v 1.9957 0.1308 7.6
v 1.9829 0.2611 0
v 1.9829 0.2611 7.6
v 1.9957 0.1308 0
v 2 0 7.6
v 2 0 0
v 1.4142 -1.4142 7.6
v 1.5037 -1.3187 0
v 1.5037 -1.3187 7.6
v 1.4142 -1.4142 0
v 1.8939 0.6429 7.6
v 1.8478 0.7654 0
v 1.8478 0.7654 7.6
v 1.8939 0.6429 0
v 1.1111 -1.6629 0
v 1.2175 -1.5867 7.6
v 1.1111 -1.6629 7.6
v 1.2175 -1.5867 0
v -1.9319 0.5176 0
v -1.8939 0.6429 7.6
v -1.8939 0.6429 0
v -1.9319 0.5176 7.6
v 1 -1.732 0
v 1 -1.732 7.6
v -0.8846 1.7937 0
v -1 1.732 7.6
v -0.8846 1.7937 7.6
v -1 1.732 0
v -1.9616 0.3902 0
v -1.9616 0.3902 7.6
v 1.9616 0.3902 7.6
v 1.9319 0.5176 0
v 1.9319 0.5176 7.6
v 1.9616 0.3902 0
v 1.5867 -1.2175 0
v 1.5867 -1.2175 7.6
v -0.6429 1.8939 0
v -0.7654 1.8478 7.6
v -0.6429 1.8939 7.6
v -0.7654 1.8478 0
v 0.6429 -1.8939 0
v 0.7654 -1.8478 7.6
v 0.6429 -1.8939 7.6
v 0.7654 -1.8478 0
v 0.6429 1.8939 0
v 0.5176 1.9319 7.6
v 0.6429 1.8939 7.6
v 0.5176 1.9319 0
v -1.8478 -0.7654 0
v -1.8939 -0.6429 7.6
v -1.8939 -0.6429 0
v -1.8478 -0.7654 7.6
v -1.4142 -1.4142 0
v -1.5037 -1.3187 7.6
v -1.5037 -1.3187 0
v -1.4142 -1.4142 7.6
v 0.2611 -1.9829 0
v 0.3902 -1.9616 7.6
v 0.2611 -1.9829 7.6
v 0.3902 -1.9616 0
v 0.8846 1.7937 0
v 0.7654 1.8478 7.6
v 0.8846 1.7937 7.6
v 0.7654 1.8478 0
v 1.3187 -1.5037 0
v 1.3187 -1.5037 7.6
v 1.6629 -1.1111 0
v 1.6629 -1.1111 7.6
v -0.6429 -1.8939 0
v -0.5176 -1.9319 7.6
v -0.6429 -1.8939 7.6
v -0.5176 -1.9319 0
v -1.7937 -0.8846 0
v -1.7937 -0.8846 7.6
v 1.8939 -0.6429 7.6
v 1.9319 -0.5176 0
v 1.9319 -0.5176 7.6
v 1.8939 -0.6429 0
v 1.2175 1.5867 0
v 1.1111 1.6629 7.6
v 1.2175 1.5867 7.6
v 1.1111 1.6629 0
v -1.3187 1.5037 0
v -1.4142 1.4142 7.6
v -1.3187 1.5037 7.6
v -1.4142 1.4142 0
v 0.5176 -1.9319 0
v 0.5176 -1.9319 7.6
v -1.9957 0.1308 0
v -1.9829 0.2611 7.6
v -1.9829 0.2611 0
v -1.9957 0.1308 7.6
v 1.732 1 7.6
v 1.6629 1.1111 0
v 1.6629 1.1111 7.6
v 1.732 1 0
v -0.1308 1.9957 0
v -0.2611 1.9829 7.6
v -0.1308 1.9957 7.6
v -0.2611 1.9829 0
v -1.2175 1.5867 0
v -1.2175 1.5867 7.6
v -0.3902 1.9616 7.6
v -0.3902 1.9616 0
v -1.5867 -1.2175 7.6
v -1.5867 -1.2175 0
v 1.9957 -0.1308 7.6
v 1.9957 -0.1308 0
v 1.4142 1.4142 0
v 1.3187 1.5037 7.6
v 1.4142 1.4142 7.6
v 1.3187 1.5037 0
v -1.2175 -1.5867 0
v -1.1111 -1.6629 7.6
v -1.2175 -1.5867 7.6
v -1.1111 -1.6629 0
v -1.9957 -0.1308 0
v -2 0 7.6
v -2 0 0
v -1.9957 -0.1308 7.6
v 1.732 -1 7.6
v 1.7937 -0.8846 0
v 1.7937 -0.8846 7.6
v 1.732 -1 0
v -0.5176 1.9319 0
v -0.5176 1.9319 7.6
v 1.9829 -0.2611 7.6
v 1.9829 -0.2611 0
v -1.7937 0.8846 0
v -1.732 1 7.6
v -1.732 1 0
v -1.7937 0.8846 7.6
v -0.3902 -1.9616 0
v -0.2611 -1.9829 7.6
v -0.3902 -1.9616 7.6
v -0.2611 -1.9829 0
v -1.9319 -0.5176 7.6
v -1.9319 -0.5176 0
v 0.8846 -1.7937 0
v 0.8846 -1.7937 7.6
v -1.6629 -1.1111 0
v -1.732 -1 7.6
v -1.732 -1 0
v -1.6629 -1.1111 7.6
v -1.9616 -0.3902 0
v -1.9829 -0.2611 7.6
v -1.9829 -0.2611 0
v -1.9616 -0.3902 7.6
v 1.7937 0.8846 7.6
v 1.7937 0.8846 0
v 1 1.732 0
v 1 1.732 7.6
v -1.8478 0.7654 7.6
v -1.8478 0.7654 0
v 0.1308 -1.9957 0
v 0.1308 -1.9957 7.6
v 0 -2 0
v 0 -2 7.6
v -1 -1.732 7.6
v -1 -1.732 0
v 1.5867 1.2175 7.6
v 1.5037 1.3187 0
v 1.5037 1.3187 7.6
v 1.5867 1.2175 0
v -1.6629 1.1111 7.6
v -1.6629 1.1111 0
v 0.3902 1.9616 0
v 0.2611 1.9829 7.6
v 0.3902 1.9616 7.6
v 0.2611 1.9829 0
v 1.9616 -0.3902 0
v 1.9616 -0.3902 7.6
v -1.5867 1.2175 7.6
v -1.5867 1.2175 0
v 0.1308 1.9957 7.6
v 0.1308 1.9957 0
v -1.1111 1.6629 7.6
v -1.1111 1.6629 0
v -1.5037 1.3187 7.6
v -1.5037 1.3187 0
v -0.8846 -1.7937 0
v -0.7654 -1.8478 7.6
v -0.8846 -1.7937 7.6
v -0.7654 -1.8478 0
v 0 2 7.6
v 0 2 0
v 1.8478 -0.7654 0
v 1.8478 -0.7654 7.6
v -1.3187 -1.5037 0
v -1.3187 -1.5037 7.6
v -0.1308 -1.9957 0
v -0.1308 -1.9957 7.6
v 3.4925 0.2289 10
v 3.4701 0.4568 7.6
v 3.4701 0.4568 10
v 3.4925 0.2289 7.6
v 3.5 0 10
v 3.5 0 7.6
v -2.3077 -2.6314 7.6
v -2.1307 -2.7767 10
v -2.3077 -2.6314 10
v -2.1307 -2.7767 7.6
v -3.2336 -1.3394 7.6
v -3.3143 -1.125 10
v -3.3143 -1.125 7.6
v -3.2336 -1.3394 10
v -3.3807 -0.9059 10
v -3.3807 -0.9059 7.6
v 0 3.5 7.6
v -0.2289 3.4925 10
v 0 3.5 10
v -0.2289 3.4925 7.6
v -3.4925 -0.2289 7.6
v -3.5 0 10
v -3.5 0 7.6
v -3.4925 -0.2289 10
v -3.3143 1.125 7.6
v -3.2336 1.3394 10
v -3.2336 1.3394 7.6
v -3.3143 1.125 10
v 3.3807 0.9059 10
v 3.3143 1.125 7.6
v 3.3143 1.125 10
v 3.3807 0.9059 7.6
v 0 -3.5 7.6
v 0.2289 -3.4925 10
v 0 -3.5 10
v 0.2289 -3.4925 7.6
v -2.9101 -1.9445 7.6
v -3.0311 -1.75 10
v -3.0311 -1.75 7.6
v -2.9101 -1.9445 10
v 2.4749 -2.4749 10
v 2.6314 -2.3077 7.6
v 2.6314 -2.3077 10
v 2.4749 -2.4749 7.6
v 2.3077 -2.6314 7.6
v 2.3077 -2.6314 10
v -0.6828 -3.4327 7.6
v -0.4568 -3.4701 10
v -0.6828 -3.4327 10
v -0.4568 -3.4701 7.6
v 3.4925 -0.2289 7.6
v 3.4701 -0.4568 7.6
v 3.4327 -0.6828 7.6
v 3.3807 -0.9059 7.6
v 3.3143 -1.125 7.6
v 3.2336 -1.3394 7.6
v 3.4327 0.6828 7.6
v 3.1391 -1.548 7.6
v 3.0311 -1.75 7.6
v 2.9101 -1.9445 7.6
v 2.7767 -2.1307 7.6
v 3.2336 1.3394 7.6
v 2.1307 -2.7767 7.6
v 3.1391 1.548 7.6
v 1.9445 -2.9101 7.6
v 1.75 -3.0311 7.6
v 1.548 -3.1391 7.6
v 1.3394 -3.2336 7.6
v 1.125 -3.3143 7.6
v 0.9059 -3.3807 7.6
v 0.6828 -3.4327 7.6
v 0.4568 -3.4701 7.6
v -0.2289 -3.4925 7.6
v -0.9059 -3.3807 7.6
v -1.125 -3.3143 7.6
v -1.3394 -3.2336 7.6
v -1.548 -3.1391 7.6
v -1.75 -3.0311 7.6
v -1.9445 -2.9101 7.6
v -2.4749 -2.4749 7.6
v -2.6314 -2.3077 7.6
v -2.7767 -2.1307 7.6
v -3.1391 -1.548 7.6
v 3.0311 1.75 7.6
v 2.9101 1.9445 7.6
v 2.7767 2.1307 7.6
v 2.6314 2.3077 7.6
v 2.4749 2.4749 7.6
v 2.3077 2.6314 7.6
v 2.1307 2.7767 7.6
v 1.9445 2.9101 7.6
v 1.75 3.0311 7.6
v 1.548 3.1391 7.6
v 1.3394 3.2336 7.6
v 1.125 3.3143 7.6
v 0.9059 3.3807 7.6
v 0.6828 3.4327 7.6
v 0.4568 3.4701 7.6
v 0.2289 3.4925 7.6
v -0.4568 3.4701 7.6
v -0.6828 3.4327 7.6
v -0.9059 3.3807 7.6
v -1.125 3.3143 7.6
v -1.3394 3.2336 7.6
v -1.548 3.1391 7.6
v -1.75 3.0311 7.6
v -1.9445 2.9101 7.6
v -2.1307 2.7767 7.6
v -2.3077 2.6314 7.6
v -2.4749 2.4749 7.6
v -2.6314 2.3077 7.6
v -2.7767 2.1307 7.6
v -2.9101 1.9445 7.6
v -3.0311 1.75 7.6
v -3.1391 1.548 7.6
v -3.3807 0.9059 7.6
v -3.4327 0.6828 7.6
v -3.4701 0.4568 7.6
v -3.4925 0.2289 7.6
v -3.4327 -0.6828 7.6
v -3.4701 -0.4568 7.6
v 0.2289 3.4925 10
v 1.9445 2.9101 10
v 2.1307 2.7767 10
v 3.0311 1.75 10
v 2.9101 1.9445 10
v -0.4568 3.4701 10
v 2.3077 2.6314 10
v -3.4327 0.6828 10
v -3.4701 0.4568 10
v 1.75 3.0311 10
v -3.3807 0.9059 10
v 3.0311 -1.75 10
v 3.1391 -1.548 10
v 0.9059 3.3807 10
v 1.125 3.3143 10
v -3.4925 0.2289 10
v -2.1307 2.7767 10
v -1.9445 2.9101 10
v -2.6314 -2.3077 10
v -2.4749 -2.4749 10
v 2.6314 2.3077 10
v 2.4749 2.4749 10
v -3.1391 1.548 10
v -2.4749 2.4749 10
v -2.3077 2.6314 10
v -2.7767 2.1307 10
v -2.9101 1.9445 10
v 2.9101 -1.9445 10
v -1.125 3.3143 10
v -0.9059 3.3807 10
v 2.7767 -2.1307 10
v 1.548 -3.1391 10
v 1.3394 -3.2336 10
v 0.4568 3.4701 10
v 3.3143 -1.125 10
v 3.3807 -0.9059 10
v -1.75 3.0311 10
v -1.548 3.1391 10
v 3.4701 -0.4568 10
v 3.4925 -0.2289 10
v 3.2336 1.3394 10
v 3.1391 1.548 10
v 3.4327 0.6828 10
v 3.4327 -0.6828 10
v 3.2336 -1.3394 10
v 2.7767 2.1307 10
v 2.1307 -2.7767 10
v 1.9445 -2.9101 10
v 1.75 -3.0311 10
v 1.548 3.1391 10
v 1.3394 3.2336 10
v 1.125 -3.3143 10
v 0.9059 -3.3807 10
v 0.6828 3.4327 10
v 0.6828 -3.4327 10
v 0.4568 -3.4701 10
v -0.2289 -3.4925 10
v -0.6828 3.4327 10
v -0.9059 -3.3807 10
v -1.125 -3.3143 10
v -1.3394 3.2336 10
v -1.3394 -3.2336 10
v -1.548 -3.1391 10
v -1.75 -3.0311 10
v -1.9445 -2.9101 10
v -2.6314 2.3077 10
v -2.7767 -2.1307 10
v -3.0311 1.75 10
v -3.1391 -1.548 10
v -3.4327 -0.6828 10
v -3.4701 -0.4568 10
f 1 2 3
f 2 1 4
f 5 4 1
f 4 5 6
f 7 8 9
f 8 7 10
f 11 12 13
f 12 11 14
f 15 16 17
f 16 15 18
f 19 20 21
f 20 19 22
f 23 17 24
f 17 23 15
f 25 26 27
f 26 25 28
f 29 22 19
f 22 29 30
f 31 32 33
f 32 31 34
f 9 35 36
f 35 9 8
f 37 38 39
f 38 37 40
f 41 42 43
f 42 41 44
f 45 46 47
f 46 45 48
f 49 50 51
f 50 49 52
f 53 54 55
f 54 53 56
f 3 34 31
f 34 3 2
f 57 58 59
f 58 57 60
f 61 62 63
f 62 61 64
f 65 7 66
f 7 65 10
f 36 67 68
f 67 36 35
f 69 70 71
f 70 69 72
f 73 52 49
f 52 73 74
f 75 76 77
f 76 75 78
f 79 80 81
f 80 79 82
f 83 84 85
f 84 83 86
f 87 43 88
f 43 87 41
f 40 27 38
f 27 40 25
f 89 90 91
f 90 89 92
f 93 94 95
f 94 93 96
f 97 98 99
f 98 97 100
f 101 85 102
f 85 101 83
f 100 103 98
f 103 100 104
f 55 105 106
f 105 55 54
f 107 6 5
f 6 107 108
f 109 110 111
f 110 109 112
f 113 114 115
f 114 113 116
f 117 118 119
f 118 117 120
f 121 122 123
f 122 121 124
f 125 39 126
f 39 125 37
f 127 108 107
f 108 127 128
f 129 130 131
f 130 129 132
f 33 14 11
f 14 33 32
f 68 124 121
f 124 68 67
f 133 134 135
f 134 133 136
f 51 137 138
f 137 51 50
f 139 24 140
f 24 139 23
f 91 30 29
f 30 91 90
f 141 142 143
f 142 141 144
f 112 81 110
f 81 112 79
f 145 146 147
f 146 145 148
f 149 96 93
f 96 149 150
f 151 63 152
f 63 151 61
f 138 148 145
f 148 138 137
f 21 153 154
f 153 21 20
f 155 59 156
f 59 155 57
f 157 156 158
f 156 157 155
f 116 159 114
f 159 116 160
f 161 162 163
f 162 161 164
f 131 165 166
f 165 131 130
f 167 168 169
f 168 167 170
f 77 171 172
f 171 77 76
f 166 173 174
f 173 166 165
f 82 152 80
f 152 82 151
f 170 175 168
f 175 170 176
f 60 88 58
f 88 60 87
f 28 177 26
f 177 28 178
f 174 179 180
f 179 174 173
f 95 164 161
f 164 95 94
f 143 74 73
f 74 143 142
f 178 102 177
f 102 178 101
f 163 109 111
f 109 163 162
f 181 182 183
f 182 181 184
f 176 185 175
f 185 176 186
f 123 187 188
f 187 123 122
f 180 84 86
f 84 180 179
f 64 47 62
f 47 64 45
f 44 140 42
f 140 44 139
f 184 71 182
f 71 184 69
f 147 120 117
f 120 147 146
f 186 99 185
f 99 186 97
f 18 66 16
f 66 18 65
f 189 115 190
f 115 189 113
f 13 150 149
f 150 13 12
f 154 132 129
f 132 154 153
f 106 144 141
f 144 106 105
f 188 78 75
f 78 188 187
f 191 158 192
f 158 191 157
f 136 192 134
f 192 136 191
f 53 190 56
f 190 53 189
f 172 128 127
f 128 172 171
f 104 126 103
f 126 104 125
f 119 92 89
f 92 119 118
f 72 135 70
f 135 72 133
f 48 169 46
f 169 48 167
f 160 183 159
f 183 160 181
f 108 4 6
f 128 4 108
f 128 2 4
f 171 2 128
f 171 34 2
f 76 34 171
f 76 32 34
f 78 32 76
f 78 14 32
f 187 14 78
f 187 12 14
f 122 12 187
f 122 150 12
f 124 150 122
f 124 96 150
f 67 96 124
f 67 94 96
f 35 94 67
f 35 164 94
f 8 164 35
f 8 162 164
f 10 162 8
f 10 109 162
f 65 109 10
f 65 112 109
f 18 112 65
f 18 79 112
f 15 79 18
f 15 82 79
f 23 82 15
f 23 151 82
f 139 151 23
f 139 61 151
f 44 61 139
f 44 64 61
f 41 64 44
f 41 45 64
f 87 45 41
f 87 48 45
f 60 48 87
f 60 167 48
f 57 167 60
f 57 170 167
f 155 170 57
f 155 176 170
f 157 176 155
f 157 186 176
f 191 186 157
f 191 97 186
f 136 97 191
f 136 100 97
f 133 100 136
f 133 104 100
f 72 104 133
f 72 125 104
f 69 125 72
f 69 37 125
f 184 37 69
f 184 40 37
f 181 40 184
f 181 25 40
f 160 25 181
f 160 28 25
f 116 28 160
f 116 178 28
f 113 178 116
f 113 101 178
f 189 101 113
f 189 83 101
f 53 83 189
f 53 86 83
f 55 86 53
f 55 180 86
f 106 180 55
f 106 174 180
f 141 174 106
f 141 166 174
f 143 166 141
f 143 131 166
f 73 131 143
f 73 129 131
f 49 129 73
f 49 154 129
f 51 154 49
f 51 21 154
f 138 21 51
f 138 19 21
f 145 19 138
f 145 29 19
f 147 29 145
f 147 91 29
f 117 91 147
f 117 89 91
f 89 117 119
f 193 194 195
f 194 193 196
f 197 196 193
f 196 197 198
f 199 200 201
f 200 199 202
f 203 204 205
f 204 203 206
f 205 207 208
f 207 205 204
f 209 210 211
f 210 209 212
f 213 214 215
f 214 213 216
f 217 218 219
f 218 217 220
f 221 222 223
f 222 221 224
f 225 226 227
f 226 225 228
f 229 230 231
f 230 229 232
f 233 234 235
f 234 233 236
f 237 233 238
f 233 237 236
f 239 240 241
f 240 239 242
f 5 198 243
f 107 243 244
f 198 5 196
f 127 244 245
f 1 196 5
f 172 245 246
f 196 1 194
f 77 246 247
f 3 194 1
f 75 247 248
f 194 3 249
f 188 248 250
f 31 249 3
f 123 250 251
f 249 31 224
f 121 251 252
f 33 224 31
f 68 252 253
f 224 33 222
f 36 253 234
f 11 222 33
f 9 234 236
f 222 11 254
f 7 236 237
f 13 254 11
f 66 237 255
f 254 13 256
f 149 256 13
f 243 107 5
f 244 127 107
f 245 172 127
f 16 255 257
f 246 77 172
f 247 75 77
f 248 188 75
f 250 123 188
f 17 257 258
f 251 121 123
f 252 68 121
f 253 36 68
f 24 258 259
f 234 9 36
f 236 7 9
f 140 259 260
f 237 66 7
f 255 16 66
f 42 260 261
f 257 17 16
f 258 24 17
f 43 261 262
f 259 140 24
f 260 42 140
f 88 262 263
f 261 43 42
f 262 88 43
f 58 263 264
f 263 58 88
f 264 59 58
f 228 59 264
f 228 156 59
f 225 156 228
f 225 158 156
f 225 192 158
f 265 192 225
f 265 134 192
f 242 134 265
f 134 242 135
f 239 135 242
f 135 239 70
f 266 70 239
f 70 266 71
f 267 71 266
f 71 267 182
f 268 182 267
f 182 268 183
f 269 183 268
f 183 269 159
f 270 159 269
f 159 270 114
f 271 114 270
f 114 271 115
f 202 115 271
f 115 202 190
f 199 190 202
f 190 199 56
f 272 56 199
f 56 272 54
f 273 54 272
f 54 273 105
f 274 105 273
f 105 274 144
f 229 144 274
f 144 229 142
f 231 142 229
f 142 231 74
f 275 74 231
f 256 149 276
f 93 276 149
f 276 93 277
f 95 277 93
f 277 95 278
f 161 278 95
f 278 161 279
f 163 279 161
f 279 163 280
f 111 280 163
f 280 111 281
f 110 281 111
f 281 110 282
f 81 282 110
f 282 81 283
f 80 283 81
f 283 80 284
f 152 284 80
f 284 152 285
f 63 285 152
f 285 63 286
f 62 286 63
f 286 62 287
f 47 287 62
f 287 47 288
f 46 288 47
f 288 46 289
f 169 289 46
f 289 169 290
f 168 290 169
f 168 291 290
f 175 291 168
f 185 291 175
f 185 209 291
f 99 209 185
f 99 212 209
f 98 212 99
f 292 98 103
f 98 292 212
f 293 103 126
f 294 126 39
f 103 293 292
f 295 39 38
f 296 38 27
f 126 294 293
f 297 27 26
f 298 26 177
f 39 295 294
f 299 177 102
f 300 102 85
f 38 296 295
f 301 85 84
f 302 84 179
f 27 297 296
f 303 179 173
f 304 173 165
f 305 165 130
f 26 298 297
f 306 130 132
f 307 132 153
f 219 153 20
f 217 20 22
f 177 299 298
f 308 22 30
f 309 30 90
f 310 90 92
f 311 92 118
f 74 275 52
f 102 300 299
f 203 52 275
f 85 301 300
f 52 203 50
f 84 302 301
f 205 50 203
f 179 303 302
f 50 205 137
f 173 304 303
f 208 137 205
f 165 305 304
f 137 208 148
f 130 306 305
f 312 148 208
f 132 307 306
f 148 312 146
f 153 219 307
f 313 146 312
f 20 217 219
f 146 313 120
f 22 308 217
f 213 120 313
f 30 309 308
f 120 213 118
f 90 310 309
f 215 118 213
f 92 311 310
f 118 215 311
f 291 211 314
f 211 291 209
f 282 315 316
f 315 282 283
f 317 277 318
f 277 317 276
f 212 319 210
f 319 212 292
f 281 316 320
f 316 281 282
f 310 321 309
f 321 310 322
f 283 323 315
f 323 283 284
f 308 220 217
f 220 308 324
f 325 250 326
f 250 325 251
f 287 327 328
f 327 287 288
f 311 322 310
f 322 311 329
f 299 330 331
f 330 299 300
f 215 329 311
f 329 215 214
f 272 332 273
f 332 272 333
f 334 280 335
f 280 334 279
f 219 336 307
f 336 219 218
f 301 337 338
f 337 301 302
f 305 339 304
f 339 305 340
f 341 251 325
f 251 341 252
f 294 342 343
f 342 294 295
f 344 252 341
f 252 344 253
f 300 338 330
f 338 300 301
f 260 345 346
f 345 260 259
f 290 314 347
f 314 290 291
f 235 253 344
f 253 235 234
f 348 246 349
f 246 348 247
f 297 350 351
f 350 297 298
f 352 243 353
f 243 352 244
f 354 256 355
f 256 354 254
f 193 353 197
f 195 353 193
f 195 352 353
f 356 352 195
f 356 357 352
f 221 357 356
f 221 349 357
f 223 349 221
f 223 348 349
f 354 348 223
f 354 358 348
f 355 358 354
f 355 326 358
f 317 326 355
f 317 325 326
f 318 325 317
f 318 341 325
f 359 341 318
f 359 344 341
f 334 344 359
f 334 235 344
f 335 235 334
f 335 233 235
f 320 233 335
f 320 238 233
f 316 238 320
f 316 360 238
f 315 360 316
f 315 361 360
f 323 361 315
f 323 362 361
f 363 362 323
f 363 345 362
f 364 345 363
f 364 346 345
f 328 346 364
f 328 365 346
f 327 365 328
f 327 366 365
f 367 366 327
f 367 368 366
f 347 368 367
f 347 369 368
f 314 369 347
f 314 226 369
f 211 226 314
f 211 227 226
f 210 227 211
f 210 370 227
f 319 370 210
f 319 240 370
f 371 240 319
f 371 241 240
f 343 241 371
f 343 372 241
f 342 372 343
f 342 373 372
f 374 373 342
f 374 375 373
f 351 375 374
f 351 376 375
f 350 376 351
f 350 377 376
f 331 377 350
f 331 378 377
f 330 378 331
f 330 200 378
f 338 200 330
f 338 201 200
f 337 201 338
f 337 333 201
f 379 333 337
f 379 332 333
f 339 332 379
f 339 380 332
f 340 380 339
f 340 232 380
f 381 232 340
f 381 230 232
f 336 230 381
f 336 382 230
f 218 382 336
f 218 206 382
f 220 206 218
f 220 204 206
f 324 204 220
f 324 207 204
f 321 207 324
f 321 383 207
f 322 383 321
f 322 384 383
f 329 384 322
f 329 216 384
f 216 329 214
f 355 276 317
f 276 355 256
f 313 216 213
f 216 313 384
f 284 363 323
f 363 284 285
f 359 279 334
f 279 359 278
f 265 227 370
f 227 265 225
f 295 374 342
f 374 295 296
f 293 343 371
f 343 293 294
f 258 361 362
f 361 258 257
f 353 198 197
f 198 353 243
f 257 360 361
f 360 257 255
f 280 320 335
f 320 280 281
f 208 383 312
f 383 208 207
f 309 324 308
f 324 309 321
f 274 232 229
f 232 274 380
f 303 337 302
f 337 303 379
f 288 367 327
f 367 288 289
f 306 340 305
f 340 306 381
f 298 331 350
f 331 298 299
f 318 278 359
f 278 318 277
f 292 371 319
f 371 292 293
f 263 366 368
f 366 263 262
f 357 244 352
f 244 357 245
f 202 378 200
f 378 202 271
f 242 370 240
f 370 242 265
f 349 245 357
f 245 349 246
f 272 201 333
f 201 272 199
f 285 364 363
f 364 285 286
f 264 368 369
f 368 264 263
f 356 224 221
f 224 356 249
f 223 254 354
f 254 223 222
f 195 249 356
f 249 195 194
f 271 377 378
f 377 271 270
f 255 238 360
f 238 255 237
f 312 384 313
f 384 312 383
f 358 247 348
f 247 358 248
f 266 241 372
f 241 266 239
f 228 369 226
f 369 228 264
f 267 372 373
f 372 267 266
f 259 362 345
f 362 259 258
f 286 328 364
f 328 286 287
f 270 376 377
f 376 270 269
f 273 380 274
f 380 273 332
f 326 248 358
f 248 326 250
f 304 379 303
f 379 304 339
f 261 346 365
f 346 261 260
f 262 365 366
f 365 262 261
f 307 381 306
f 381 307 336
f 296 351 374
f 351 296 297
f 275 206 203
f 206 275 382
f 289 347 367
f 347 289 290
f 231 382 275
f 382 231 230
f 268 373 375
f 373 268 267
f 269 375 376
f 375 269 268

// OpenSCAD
// Simple screw: 4.0mm shaft diameter, 7.0mm head diameter, head height 2.4mm, total length 10mm
$fn = 96;

// Parameters (mm)
shaft_diameter_mm = 4.0;
length_mm         = 10.0;

head_diameter_mm  = 7.0;
head_height_mm    = 2.4;

// Small overlap to ensure one connected solid
overlap_mm = 0.2;

module screw_simple() {
    shaft_r = shaft_diameter_mm/2;
    head_r  = head_diameter_mm/2;

    // Place screw along +Z, bottom at z=0, top at z=length_mm
    union() {
        // Shaft (under head)
        cylinder(h = length_mm - head_height_mm + overlap_mm, r = shaft_r, center = false);

        // Head (on top), overlapping slightly into shaft
        translate([0, 0, length_mm - head_height_mm])
            cylinder(h = head_height_mm, r = head_r, center = false);
    }
}

screw_simple();
